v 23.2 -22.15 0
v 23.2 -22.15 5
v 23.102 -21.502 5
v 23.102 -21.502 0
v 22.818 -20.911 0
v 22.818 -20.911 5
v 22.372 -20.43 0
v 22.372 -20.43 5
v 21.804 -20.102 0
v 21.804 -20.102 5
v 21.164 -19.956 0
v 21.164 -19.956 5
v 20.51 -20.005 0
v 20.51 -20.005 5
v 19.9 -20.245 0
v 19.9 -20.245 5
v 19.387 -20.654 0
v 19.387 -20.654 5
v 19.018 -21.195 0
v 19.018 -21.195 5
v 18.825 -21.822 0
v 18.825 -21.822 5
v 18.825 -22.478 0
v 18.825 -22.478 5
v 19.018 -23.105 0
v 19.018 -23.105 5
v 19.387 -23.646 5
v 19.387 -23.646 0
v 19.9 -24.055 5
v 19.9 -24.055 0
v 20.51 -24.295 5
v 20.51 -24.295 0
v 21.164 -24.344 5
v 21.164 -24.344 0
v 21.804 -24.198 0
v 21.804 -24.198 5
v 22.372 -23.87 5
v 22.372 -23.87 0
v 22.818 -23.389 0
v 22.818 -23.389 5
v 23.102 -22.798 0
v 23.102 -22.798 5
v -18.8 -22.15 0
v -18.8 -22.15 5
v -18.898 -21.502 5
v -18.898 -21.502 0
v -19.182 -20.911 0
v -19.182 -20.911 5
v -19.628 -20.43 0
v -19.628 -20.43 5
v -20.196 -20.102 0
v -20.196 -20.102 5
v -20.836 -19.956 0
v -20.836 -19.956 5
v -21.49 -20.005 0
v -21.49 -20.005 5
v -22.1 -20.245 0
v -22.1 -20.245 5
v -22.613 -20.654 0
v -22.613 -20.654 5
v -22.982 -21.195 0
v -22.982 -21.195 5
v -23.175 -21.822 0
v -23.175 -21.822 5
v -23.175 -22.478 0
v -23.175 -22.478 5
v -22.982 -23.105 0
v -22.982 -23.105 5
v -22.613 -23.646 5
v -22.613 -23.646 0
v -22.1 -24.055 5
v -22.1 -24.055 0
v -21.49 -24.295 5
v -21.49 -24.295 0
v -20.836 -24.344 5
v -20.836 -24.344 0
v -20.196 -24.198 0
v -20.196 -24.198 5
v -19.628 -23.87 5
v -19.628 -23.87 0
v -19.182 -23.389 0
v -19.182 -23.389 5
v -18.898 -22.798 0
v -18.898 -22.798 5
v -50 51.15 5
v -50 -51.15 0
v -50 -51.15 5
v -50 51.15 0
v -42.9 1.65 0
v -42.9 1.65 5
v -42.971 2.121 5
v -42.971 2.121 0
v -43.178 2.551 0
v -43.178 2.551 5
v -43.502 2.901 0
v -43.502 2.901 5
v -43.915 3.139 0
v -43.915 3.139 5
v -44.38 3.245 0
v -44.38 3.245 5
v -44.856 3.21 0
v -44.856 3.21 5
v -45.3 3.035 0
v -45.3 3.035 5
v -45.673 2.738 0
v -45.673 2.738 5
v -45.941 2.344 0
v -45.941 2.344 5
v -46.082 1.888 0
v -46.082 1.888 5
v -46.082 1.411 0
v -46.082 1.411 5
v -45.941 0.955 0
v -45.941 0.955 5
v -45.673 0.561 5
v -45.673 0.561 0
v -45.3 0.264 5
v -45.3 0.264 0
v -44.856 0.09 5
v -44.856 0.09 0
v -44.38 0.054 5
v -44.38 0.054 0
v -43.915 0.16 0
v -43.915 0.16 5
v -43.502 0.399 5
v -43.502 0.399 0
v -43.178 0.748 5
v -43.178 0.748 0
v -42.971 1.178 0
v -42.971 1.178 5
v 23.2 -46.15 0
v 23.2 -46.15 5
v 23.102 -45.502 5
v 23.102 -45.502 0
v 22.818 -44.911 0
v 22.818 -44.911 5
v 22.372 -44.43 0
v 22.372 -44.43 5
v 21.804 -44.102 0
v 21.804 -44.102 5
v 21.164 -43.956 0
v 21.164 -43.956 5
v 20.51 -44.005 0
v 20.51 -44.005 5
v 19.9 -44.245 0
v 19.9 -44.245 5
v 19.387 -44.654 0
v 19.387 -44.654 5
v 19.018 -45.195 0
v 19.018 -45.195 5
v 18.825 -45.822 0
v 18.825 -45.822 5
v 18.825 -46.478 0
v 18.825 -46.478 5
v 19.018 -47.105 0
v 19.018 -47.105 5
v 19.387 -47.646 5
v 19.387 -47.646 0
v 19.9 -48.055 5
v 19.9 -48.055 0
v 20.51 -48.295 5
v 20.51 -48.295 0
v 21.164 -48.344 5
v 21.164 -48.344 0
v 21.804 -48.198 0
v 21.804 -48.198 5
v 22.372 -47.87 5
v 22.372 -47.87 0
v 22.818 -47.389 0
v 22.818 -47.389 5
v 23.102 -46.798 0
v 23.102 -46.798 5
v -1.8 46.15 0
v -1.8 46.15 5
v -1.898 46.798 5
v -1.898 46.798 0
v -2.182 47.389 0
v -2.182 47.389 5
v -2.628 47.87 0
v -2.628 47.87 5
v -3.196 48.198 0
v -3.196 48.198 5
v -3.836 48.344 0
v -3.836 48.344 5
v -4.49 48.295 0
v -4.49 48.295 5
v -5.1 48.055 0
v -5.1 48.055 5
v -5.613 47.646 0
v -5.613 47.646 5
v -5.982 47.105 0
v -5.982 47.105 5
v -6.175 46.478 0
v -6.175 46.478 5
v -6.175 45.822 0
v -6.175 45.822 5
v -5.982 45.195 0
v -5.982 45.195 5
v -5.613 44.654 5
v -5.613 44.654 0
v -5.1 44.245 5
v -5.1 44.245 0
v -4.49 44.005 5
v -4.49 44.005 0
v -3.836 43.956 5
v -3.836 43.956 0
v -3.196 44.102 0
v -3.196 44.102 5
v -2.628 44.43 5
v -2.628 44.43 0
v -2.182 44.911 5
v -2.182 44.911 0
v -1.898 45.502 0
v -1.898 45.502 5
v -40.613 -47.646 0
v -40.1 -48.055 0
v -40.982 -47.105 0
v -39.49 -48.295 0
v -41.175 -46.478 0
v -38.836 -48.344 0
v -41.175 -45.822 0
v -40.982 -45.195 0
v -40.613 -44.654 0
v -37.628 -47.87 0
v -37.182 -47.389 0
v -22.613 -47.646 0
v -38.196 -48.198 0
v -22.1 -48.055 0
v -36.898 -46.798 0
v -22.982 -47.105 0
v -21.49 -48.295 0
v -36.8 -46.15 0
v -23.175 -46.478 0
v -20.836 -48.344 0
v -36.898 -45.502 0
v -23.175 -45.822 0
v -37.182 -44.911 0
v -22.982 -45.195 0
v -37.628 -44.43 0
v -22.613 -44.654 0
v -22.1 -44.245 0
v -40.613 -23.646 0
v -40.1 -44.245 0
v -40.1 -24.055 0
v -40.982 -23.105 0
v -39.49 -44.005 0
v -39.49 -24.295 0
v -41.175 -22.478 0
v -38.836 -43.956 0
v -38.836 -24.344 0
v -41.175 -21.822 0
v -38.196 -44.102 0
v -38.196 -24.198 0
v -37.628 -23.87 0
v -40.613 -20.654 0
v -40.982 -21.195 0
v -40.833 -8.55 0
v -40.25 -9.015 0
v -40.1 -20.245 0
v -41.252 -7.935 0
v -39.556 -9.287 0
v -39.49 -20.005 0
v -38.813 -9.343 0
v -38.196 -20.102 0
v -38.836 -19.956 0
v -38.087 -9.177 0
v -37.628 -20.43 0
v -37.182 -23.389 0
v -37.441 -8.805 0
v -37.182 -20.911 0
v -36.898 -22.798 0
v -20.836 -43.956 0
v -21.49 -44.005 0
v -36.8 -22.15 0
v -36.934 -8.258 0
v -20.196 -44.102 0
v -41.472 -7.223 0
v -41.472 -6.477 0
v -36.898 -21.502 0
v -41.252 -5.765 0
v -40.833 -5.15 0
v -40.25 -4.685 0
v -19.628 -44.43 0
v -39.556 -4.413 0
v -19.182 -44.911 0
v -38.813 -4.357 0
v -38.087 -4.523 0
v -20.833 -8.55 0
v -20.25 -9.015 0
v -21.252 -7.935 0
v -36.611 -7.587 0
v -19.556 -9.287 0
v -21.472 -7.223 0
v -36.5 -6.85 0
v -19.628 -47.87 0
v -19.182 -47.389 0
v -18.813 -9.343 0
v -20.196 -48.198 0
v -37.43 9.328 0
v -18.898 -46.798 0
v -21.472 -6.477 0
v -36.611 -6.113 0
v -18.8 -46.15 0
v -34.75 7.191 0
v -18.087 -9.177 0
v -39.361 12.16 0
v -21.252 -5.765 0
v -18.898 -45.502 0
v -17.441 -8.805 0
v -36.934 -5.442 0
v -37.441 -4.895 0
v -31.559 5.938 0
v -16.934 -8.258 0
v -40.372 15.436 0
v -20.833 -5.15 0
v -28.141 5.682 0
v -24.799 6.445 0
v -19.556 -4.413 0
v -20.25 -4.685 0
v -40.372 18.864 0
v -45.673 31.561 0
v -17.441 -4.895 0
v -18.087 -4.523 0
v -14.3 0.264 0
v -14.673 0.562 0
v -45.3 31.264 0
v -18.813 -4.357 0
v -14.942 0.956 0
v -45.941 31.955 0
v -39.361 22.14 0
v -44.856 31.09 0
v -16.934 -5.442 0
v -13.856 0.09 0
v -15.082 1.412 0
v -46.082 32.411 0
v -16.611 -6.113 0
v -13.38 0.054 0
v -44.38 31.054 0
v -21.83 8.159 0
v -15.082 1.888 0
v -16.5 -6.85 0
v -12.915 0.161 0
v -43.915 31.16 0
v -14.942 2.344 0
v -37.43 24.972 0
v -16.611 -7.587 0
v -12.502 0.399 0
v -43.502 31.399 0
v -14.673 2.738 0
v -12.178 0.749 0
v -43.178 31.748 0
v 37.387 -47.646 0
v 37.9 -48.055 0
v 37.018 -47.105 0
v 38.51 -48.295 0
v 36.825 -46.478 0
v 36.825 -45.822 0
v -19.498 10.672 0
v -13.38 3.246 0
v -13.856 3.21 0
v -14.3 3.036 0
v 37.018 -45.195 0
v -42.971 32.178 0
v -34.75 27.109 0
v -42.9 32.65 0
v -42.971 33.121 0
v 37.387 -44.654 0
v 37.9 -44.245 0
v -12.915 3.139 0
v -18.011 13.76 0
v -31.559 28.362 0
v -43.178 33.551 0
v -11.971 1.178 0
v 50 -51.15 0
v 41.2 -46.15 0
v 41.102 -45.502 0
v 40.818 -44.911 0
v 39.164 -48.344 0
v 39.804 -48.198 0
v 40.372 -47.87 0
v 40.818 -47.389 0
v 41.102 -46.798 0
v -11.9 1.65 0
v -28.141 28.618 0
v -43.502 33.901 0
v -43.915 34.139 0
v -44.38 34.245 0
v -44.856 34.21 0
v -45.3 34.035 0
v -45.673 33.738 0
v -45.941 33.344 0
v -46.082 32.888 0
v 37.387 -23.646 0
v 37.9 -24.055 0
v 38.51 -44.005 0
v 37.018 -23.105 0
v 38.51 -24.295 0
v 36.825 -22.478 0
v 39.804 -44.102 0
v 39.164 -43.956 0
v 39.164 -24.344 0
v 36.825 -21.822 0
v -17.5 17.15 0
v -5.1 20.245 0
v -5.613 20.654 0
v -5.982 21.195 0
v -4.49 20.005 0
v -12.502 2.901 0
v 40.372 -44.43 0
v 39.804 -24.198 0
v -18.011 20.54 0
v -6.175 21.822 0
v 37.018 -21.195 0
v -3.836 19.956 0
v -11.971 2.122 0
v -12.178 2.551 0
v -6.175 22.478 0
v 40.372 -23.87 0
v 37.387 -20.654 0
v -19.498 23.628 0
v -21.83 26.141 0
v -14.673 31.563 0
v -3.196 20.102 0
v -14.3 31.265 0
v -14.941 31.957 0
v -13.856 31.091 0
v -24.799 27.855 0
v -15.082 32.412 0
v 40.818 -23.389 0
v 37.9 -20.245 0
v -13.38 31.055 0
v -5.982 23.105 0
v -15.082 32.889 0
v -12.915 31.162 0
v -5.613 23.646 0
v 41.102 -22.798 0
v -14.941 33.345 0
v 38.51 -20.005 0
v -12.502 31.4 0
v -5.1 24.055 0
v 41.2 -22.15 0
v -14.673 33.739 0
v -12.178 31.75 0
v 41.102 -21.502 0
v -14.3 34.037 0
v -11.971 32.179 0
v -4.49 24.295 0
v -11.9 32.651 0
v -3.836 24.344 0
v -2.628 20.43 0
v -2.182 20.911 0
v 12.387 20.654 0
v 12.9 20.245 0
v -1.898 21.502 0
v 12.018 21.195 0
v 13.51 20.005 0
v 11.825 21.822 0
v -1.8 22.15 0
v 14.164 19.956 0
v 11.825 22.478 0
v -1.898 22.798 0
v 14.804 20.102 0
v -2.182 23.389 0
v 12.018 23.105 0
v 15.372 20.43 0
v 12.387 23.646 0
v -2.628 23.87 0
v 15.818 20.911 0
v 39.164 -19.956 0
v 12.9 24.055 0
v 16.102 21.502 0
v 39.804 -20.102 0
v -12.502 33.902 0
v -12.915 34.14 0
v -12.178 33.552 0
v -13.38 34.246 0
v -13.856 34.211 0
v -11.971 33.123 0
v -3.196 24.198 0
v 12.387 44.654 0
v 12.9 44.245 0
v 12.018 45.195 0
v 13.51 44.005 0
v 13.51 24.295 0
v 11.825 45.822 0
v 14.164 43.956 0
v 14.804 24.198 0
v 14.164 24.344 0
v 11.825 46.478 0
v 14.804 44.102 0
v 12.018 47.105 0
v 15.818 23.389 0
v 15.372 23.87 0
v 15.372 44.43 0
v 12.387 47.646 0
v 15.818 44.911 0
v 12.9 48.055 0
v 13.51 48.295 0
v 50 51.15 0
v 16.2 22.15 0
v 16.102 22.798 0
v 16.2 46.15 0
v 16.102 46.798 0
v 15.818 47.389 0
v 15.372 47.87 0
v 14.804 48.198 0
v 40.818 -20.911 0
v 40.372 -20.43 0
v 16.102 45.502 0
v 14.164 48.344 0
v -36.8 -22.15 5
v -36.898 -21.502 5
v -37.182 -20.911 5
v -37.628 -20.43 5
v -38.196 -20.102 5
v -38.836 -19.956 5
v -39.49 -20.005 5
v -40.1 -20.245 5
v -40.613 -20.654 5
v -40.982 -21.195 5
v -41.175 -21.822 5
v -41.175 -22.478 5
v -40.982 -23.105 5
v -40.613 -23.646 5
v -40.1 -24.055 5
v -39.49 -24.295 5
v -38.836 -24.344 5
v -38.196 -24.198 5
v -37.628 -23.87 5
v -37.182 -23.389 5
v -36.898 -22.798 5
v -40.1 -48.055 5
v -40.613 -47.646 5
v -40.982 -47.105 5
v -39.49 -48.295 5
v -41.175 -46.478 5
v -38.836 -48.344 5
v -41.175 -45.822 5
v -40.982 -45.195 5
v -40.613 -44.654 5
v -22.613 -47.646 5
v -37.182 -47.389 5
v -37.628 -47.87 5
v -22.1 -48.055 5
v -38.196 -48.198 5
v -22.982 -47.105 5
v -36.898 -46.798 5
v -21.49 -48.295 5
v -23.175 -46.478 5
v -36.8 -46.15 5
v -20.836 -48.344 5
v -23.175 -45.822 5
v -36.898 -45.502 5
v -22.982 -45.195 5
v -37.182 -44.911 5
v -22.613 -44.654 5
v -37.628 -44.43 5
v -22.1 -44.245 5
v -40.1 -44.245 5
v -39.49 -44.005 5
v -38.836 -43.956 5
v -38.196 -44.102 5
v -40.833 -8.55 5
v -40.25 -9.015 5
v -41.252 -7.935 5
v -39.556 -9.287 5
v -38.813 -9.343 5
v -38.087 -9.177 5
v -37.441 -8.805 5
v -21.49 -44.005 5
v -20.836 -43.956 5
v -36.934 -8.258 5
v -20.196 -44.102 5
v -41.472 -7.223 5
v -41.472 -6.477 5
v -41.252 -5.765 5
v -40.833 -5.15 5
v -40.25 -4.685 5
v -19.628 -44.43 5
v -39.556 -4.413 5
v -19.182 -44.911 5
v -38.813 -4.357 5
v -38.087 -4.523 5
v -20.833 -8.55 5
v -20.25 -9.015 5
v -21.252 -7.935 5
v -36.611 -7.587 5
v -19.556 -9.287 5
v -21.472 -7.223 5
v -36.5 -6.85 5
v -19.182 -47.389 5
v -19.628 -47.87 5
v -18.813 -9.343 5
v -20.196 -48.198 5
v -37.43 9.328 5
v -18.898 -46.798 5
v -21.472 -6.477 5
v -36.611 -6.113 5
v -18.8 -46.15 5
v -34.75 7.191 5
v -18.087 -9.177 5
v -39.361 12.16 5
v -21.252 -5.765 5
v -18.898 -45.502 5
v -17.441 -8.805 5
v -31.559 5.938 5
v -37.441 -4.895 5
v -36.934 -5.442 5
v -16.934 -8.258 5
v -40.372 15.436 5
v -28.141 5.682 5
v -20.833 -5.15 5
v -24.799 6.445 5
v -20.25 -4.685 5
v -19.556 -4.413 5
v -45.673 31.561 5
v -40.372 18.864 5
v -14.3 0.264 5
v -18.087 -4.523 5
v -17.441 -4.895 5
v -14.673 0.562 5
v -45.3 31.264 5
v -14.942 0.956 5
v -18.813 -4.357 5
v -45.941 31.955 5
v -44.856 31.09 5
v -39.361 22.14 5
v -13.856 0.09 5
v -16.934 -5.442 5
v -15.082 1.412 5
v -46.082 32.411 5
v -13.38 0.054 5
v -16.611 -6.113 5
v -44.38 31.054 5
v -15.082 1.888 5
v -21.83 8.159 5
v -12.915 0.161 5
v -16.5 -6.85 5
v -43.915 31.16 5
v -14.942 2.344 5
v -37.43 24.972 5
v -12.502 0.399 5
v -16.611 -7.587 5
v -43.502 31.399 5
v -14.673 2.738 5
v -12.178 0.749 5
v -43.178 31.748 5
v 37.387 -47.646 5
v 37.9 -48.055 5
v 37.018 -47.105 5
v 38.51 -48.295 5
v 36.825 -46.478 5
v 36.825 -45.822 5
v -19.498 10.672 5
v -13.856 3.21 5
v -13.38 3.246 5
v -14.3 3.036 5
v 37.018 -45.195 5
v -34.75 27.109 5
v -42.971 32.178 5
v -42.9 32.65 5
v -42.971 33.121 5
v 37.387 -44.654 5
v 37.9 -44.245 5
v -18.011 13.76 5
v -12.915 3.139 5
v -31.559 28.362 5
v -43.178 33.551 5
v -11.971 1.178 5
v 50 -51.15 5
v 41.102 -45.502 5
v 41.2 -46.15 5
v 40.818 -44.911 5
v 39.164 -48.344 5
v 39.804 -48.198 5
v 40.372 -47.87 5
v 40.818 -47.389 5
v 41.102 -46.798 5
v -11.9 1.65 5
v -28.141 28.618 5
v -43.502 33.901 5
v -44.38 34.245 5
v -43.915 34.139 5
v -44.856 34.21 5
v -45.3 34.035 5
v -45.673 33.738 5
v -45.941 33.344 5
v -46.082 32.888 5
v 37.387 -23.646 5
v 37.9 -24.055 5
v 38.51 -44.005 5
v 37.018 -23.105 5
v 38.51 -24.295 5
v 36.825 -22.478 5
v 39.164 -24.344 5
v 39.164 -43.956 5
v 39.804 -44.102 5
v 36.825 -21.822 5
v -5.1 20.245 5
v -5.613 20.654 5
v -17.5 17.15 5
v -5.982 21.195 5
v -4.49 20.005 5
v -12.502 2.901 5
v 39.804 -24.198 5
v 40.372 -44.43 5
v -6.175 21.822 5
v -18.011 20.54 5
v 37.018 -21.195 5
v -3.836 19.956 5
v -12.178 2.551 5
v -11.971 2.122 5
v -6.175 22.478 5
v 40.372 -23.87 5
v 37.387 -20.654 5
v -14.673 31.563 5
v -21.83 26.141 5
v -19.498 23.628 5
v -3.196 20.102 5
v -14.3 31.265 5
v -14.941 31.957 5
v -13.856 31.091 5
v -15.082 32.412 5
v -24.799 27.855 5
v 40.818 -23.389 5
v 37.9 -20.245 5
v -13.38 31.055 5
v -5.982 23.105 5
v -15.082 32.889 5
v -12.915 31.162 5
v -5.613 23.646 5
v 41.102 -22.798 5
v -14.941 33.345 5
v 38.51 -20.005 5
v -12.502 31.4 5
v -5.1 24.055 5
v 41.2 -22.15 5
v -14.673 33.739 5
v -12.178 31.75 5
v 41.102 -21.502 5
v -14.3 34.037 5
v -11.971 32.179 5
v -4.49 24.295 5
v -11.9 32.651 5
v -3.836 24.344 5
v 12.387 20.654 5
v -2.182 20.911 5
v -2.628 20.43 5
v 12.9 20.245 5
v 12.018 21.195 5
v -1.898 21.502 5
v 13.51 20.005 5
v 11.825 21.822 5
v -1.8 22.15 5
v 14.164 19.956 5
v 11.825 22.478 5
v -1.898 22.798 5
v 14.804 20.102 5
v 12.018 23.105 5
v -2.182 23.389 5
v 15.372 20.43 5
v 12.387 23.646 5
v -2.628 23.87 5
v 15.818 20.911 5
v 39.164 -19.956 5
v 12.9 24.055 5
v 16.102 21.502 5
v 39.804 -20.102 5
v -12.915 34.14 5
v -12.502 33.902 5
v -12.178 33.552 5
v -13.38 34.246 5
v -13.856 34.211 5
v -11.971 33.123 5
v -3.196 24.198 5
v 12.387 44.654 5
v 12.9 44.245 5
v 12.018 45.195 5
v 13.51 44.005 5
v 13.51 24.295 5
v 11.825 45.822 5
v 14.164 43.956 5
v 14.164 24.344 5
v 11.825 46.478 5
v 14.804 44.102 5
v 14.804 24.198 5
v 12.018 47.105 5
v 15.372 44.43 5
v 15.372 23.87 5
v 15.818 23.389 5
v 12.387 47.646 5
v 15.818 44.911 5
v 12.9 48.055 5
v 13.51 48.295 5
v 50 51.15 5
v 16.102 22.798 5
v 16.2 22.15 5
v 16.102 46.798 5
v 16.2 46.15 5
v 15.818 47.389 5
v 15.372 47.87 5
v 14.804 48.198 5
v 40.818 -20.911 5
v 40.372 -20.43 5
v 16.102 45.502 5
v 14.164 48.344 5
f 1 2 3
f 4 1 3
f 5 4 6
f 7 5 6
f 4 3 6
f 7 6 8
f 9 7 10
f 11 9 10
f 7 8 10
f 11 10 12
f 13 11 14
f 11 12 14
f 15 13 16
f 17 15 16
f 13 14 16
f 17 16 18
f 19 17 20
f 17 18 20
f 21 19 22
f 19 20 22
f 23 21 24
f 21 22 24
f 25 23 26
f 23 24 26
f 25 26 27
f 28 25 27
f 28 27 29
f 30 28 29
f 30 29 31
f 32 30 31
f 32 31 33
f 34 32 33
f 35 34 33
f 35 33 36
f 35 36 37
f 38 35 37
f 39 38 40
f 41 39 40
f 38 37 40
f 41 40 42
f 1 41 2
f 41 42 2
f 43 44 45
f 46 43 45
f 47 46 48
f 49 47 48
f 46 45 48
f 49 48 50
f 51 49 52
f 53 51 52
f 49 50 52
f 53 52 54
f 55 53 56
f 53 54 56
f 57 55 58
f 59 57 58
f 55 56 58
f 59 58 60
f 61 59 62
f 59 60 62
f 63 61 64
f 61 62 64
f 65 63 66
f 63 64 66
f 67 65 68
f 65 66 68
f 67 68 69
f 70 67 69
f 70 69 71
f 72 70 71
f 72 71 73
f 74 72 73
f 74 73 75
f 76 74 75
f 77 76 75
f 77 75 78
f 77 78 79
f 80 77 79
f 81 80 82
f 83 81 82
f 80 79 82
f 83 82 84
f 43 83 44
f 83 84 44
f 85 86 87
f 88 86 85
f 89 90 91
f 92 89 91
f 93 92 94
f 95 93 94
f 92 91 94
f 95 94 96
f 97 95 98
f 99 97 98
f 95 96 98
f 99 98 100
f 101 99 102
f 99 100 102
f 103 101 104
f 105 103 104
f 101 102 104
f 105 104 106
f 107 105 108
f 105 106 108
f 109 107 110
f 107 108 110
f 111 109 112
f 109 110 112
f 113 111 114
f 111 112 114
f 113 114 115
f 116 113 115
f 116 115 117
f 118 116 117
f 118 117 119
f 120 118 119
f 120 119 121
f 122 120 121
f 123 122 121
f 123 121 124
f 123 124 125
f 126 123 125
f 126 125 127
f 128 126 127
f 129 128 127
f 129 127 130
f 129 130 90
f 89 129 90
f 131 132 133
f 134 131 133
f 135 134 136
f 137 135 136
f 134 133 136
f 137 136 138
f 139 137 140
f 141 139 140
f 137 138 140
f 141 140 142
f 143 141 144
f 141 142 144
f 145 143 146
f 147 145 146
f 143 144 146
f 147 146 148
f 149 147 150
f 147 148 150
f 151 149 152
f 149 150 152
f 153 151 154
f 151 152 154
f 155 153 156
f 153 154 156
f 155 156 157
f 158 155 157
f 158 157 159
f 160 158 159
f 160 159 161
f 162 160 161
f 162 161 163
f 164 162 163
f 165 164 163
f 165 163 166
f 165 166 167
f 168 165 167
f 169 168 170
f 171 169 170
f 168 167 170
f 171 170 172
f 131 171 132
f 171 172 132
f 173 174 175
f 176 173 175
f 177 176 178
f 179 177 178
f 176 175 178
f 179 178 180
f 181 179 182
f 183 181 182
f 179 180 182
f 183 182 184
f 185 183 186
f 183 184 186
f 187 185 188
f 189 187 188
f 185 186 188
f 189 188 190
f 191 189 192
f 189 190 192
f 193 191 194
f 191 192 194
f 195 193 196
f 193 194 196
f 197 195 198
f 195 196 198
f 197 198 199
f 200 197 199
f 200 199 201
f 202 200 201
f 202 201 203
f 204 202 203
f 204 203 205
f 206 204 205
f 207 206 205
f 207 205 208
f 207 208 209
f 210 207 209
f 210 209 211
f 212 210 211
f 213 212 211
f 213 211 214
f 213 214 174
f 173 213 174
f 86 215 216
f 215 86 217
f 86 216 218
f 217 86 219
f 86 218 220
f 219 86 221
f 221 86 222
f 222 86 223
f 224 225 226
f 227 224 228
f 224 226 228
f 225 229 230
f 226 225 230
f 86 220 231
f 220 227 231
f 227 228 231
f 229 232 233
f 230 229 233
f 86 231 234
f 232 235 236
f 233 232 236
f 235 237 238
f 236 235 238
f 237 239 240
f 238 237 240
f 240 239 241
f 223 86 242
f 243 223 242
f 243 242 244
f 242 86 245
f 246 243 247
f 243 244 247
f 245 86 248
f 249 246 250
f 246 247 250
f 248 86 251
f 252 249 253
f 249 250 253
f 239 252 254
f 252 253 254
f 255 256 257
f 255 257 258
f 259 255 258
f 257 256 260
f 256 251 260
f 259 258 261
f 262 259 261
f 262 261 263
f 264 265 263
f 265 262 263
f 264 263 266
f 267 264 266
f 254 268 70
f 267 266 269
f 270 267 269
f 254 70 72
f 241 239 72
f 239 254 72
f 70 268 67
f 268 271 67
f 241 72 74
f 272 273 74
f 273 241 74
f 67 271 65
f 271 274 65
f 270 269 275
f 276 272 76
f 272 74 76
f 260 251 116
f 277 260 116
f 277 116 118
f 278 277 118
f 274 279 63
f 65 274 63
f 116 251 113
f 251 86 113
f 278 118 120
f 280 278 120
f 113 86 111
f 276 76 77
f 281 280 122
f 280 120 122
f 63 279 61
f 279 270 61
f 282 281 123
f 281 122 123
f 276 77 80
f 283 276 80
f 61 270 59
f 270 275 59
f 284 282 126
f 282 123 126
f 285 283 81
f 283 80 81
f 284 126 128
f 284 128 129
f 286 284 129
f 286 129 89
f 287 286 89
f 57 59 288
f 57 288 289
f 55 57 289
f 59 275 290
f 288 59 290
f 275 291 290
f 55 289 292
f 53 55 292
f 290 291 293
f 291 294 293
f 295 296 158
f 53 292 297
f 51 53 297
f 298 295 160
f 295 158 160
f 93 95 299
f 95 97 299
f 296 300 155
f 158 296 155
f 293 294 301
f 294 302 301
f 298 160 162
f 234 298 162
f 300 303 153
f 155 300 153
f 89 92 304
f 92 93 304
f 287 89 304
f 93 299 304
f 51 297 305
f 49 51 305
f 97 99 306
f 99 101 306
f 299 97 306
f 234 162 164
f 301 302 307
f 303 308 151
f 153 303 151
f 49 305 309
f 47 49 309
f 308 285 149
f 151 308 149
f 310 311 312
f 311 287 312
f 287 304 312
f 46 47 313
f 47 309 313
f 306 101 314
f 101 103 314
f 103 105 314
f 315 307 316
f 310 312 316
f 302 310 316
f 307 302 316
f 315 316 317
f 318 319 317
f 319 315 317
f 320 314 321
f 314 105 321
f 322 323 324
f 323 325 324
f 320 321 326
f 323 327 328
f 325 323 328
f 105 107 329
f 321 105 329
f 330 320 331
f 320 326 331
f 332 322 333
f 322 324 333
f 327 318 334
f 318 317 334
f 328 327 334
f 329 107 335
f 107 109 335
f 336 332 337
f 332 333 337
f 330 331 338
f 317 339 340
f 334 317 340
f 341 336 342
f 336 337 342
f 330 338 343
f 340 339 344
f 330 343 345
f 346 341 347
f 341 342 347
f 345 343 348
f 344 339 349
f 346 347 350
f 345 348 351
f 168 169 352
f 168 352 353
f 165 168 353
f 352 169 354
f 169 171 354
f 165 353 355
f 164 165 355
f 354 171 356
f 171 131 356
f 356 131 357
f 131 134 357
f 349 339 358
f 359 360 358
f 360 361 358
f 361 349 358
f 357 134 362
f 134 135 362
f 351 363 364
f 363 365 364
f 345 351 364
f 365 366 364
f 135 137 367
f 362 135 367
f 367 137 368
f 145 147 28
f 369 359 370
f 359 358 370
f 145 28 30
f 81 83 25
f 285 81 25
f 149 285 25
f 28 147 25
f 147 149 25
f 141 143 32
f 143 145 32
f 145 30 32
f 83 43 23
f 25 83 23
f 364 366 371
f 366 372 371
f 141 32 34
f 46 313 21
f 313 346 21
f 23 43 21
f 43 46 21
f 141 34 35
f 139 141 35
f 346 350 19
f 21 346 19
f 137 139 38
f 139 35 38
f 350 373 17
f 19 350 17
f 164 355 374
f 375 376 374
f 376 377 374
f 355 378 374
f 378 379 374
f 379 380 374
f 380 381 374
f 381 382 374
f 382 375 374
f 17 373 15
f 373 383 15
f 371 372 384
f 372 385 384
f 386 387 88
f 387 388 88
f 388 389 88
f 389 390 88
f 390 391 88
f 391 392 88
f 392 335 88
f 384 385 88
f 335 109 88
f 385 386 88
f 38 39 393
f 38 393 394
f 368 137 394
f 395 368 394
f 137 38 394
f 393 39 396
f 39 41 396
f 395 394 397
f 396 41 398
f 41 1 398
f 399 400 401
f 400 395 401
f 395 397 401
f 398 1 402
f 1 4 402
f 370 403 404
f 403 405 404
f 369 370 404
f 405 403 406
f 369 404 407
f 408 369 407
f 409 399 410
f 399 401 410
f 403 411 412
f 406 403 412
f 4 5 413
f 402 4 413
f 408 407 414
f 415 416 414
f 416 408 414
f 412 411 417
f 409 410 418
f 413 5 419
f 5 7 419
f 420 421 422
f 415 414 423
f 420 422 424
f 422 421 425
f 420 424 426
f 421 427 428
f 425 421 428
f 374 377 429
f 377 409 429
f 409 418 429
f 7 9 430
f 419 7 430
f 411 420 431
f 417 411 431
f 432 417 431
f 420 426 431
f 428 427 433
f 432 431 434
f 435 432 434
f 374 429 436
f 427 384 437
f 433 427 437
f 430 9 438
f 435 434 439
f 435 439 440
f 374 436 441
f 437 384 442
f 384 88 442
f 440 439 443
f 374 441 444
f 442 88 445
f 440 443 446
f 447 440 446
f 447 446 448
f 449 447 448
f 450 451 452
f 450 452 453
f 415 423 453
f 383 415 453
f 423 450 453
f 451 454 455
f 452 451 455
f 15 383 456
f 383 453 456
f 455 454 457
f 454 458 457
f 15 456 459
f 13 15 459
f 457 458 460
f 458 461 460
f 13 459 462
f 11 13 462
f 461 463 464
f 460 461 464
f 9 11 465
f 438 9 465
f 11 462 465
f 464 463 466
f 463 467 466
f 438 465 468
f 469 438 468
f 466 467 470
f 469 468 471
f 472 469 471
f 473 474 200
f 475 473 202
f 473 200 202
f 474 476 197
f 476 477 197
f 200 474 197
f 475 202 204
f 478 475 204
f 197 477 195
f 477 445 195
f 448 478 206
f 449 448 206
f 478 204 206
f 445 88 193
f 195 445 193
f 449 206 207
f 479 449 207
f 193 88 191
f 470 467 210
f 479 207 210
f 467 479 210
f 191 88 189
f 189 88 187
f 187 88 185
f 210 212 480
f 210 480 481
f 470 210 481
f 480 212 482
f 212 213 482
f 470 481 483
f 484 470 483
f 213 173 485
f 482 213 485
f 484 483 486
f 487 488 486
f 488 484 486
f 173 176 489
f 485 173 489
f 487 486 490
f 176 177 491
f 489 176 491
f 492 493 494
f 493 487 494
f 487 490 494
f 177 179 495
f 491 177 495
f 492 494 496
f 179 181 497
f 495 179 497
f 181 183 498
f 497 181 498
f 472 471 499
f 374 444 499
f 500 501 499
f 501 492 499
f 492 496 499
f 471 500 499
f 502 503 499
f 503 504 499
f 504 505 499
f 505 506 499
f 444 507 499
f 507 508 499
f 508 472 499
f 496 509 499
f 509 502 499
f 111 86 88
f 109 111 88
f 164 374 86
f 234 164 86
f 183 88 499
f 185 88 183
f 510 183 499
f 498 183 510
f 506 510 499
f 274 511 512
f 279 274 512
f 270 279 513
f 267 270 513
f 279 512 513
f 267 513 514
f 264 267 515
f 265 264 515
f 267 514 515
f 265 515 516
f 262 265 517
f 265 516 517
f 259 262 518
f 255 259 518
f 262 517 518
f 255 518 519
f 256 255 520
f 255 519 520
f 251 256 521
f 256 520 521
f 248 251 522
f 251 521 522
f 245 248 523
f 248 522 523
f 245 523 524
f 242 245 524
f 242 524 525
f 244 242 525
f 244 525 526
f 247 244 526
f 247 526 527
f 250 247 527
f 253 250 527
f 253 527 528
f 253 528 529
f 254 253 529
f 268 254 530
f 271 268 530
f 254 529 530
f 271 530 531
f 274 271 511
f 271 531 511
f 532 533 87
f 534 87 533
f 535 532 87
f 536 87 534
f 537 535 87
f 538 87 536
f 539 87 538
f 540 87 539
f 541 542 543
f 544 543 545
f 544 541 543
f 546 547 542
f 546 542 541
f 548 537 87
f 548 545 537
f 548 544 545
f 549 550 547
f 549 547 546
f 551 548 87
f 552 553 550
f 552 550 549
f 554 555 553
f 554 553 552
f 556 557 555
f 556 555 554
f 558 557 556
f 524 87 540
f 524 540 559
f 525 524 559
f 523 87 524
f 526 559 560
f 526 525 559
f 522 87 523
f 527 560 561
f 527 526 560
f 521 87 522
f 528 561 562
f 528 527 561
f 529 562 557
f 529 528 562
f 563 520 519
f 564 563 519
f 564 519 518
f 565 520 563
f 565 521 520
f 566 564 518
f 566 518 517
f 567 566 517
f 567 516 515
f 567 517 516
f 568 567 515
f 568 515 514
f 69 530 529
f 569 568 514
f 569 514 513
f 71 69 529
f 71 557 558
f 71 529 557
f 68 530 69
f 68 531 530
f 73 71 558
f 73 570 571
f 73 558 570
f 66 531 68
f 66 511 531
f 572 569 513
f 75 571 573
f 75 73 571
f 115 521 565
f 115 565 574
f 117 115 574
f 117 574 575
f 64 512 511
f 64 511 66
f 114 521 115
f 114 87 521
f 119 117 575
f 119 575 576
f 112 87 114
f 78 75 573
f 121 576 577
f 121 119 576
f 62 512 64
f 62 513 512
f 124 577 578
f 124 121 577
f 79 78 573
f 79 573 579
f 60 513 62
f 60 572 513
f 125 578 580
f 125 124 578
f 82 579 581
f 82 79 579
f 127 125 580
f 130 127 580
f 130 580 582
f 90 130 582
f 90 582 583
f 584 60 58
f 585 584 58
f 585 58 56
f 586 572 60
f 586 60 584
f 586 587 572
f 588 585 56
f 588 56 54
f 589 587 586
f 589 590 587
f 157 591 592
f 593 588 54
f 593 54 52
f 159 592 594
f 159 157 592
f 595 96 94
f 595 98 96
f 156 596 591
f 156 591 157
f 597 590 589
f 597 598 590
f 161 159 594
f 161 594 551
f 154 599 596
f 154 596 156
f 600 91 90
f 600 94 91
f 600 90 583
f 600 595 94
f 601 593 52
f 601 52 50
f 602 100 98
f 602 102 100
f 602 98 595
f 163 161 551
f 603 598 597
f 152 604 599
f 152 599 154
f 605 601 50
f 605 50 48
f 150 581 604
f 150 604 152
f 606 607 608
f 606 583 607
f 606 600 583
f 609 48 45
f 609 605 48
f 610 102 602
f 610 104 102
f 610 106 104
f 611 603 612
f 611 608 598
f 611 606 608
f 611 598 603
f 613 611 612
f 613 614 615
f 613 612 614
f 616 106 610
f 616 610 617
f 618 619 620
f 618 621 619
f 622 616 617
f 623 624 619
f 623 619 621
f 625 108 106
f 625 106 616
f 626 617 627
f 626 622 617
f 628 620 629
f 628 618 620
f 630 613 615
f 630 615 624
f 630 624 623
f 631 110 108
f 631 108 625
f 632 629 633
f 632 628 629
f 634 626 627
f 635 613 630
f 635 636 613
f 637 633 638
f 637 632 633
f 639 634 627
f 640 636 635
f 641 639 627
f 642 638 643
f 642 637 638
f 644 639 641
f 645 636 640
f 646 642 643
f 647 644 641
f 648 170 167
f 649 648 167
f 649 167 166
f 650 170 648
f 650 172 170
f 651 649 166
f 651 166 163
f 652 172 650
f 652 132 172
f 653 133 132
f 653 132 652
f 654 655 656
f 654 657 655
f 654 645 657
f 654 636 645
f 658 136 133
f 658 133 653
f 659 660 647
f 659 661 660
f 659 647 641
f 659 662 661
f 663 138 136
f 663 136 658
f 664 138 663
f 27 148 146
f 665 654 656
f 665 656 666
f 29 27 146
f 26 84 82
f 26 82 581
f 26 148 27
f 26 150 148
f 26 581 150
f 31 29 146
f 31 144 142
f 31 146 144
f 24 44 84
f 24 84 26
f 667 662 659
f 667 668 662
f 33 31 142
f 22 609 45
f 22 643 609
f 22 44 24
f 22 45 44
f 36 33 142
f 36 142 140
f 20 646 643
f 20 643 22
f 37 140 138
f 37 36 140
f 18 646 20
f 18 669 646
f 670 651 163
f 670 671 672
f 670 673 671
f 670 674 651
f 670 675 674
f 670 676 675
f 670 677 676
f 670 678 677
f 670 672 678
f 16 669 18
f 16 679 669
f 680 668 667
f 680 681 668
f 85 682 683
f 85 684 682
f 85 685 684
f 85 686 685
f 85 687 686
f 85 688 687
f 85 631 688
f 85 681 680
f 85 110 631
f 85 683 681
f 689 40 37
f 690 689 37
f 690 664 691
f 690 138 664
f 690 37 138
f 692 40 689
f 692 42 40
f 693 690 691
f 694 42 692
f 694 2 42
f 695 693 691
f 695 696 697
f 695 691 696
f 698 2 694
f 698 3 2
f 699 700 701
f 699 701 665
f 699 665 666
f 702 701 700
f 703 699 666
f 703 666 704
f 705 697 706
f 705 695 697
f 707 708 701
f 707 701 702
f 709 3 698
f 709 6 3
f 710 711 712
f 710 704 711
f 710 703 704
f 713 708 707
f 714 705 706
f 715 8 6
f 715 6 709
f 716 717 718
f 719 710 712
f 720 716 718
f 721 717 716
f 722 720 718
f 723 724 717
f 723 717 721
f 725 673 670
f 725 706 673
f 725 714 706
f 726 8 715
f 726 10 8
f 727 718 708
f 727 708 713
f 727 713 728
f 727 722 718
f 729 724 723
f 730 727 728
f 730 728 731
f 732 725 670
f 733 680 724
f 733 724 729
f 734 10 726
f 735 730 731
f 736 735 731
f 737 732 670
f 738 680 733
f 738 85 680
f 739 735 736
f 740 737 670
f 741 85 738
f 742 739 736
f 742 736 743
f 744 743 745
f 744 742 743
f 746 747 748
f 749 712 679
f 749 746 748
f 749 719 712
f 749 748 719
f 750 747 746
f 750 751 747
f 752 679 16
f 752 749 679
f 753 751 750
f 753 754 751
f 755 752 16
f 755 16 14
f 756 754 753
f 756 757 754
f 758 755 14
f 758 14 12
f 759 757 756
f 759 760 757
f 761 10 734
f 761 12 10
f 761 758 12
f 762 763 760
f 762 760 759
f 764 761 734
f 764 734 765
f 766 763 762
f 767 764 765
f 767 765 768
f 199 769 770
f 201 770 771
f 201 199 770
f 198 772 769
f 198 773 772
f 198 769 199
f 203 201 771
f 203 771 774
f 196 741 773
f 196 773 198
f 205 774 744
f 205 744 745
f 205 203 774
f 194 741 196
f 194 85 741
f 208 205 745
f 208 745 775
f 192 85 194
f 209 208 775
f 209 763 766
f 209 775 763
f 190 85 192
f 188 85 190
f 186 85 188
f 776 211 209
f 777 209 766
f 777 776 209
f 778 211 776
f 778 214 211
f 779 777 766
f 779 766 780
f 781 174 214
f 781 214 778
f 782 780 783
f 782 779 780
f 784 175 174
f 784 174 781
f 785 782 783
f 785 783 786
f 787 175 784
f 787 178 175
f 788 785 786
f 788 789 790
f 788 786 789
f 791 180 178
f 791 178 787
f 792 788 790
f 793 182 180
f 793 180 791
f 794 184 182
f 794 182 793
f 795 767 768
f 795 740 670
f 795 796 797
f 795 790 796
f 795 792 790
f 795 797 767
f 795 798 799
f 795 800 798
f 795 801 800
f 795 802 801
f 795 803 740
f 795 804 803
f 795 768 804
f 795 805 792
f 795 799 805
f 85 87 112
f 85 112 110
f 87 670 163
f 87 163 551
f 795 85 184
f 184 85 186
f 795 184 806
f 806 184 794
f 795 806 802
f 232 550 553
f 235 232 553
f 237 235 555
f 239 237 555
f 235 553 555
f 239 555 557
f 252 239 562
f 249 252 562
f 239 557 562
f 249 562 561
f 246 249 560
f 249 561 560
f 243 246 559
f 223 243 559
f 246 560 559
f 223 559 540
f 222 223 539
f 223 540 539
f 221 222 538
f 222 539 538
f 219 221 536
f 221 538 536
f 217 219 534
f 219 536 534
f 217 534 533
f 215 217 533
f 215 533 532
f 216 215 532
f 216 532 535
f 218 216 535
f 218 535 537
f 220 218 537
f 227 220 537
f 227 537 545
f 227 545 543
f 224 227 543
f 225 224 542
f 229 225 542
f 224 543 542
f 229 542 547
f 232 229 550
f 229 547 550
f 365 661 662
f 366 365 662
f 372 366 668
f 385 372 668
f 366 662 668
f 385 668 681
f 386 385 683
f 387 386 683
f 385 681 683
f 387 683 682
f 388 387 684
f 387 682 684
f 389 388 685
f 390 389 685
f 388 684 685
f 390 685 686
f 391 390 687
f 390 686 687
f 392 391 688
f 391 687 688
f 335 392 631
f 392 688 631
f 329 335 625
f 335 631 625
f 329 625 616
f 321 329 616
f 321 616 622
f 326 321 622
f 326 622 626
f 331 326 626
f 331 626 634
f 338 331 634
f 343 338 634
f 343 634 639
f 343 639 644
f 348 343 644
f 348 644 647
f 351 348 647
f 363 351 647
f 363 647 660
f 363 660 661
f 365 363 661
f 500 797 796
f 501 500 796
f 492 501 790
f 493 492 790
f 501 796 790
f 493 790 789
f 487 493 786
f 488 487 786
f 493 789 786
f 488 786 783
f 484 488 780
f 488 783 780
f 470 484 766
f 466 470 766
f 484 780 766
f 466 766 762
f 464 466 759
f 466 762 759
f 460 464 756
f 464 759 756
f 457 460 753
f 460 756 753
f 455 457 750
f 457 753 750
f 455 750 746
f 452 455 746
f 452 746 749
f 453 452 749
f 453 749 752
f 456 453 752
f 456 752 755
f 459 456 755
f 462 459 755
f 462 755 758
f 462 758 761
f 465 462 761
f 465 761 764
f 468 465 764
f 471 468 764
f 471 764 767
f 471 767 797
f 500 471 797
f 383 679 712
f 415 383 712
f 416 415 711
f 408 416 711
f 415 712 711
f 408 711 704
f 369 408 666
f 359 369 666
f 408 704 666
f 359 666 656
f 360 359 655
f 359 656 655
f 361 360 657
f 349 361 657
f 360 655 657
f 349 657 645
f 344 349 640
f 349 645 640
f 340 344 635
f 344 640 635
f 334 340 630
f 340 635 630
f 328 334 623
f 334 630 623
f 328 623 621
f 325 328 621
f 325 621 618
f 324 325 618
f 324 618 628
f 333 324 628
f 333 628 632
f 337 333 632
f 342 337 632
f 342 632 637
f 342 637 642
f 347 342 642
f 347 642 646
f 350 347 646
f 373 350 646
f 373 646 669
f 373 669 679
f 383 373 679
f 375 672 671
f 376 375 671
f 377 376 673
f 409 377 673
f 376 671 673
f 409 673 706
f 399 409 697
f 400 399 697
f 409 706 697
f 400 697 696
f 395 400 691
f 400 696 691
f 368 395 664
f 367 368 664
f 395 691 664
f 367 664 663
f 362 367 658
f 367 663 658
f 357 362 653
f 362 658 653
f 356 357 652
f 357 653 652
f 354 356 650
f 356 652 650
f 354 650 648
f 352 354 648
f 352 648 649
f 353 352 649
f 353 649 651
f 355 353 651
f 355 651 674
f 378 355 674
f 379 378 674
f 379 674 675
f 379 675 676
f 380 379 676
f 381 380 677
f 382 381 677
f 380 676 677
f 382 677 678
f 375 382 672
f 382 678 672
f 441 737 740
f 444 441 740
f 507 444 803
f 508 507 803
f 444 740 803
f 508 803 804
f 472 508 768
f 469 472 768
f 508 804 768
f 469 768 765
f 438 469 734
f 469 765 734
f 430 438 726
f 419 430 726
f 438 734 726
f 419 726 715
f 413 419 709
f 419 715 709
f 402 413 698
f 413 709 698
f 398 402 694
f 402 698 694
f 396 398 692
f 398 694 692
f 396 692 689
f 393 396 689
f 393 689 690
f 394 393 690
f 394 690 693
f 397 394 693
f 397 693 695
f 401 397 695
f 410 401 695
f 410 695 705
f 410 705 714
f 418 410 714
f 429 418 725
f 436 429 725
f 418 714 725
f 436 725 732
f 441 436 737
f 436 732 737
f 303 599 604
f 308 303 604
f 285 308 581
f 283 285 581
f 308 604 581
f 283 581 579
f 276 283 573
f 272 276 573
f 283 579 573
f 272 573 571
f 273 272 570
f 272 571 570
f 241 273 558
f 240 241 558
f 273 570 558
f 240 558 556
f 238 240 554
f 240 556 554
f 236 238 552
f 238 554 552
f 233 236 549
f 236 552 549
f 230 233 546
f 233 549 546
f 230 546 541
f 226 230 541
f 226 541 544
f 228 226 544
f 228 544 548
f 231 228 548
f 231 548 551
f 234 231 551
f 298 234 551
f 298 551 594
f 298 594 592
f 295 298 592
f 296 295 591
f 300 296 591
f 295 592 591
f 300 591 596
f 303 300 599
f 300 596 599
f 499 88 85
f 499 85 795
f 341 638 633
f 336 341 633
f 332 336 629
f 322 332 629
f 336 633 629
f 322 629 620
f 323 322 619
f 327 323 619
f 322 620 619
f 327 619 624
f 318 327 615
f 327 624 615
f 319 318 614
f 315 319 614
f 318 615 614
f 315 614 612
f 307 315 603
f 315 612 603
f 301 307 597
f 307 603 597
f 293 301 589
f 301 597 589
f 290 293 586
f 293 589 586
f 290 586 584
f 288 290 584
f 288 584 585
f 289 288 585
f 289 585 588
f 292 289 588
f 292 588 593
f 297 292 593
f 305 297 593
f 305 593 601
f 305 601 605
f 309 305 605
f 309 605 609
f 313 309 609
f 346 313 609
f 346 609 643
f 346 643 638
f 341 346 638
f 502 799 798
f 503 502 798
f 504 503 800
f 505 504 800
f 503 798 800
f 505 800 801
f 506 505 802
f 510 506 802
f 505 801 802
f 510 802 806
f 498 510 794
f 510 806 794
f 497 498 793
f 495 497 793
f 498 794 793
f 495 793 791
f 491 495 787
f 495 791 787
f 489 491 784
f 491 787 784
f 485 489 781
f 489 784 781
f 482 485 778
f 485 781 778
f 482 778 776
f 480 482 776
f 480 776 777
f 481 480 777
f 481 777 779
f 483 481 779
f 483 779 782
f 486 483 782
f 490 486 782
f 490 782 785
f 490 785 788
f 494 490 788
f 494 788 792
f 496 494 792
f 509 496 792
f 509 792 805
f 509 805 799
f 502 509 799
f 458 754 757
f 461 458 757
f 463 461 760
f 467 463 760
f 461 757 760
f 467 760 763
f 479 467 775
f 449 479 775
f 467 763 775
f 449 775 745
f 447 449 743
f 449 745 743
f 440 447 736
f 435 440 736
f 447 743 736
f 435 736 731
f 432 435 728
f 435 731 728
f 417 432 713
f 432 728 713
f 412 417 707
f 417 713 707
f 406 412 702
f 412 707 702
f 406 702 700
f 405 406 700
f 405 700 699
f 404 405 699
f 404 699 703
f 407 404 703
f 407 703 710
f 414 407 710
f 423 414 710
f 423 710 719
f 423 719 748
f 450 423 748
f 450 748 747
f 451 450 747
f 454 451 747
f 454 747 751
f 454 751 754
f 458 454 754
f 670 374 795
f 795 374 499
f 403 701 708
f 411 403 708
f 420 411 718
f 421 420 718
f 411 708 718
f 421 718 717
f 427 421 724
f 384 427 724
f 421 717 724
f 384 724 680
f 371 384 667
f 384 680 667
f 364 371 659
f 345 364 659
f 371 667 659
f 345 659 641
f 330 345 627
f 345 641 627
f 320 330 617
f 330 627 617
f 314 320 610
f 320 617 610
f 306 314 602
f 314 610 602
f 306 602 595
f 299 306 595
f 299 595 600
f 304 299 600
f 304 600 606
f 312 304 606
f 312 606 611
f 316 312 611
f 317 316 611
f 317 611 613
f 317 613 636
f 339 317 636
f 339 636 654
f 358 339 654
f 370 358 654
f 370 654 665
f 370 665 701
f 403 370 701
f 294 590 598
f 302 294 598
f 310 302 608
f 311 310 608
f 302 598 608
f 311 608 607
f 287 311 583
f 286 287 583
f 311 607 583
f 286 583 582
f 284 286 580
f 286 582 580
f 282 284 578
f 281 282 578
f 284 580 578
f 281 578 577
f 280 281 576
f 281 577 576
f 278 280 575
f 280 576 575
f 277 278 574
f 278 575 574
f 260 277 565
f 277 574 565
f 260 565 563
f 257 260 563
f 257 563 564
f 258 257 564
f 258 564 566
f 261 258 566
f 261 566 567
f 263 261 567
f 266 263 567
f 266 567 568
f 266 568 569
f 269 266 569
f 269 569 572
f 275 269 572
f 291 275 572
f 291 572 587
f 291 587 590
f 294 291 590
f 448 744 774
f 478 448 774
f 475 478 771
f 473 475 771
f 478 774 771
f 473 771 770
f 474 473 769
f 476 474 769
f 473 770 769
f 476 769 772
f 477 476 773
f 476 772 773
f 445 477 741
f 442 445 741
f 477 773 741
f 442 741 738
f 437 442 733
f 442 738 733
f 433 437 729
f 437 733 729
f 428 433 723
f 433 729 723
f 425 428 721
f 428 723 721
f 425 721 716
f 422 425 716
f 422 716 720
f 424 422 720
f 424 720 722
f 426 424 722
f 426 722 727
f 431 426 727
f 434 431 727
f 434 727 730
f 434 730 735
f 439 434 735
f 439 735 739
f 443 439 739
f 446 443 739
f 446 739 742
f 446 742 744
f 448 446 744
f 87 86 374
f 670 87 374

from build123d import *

# Parameters (mm, degrees)
SKETCH1_W           = 100
SKETCH1_H           = 102.3
BOSS_EXTRUDE1_DEPTH = 5
SKETCH4_R           = 2.2
CUT_EXTRUDE1_DEPTH  = 5
LPATTERN1_COUNT     = 2
LPATTERN1_PITCH     = 60
SKETCH6_R           = 1.6
SKETCH6_R_2         = 11.5
CUT_EXTRUDE4_DEPTH  = 10
SKETCH8_R           = 2.2
CUT_EXTRUDE5_DEPTH  = 10
SKETCH9_R           = 2.5
CUT_EXTRUDE6_DEPTH  = 10


with BuildPart() as part:
    # Sketch1 → Boss-Extrude1 (new body)
    with BuildSketch(Plane.XY):
        Rectangle(SKETCH1_W, SKETCH1_H)
    extrude(amount=BOSS_EXTRUDE1_DEPTH)

    # Sketch4 → Cut-Extrude1 (cut)
    with BuildSketch(Plane.XY.offset(5)):
        with Locations((39, -22.15)):
            Circle(SKETCH4_R)
        with Locations((39, -46.15)):
            Circle(SKETCH4_R)
        with Locations((21, -46.15)):
            Circle(SKETCH4_R)
        with Locations((21, -22.15)):
            Circle(SKETCH4_R)
    cut_extrude1 = extrude(amount=-CUT_EXTRUDE1_DEPTH, mode=Mode.SUBTRACT)

    # LPattern1: Cut-Extrude1 ×2
    with Locations(*[(-i * LPATTERN1_PITCH, 0, 0) for i in range(1, LPATTERN1_COUNT)]):
        add(cut_extrude1, mode=Mode.SUBTRACT)

    # Sketch6 → Cut-Extrude4 (cut)
    with BuildSketch(Plane.XY.offset(5)):
        with Locations((-44.499679494, 32.649679494)):
            Circle(SKETCH6_R)
        with Locations((-13.49967952, 32.650961002)):
            Circle(SKETCH6_R)
        with Locations((-44.499680011, 1.649679494)):
            Circle(SKETCH6_R)
        with Locations((-13.5, 1.65)):
            Circle(SKETCH6_R)
        with Locations((-29, 17.15)):
            Circle(SKETCH6_R_2)
    extrude(amount=-CUT_EXTRUDE4_DEPTH, mode=Mode.SUBTRACT)

    # Sketch8 → Cut-Extrude5 (cut)
    with BuildSketch(Plane.XY.offset(5)):
        with Locations((-4, 46.15)):
            Circle(SKETCH8_R)
        with Locations((14, 46.15)):
            Circle(SKETCH8_R)
        with Locations((-4, 22.15)):
            Circle(SKETCH8_R)
        with Locations((14, 22.15)):
            Circle(SKETCH8_R)
    extrude(amount=-CUT_EXTRUDE5_DEPTH, mode=Mode.SUBTRACT)

    # Sketch9 → Cut-Extrude6 (cut)
    with BuildSketch(Plane.XY.offset(5)):
        with Locations((-39, -6.85)):
            Circle(SKETCH9_R)
        with Locations((-19, -6.85)):
            Circle(SKETCH9_R)
    extrude(amount=-CUT_EXTRUDE6_DEPTH, mode=Mode.SUBTRACT)


solid = part.part
